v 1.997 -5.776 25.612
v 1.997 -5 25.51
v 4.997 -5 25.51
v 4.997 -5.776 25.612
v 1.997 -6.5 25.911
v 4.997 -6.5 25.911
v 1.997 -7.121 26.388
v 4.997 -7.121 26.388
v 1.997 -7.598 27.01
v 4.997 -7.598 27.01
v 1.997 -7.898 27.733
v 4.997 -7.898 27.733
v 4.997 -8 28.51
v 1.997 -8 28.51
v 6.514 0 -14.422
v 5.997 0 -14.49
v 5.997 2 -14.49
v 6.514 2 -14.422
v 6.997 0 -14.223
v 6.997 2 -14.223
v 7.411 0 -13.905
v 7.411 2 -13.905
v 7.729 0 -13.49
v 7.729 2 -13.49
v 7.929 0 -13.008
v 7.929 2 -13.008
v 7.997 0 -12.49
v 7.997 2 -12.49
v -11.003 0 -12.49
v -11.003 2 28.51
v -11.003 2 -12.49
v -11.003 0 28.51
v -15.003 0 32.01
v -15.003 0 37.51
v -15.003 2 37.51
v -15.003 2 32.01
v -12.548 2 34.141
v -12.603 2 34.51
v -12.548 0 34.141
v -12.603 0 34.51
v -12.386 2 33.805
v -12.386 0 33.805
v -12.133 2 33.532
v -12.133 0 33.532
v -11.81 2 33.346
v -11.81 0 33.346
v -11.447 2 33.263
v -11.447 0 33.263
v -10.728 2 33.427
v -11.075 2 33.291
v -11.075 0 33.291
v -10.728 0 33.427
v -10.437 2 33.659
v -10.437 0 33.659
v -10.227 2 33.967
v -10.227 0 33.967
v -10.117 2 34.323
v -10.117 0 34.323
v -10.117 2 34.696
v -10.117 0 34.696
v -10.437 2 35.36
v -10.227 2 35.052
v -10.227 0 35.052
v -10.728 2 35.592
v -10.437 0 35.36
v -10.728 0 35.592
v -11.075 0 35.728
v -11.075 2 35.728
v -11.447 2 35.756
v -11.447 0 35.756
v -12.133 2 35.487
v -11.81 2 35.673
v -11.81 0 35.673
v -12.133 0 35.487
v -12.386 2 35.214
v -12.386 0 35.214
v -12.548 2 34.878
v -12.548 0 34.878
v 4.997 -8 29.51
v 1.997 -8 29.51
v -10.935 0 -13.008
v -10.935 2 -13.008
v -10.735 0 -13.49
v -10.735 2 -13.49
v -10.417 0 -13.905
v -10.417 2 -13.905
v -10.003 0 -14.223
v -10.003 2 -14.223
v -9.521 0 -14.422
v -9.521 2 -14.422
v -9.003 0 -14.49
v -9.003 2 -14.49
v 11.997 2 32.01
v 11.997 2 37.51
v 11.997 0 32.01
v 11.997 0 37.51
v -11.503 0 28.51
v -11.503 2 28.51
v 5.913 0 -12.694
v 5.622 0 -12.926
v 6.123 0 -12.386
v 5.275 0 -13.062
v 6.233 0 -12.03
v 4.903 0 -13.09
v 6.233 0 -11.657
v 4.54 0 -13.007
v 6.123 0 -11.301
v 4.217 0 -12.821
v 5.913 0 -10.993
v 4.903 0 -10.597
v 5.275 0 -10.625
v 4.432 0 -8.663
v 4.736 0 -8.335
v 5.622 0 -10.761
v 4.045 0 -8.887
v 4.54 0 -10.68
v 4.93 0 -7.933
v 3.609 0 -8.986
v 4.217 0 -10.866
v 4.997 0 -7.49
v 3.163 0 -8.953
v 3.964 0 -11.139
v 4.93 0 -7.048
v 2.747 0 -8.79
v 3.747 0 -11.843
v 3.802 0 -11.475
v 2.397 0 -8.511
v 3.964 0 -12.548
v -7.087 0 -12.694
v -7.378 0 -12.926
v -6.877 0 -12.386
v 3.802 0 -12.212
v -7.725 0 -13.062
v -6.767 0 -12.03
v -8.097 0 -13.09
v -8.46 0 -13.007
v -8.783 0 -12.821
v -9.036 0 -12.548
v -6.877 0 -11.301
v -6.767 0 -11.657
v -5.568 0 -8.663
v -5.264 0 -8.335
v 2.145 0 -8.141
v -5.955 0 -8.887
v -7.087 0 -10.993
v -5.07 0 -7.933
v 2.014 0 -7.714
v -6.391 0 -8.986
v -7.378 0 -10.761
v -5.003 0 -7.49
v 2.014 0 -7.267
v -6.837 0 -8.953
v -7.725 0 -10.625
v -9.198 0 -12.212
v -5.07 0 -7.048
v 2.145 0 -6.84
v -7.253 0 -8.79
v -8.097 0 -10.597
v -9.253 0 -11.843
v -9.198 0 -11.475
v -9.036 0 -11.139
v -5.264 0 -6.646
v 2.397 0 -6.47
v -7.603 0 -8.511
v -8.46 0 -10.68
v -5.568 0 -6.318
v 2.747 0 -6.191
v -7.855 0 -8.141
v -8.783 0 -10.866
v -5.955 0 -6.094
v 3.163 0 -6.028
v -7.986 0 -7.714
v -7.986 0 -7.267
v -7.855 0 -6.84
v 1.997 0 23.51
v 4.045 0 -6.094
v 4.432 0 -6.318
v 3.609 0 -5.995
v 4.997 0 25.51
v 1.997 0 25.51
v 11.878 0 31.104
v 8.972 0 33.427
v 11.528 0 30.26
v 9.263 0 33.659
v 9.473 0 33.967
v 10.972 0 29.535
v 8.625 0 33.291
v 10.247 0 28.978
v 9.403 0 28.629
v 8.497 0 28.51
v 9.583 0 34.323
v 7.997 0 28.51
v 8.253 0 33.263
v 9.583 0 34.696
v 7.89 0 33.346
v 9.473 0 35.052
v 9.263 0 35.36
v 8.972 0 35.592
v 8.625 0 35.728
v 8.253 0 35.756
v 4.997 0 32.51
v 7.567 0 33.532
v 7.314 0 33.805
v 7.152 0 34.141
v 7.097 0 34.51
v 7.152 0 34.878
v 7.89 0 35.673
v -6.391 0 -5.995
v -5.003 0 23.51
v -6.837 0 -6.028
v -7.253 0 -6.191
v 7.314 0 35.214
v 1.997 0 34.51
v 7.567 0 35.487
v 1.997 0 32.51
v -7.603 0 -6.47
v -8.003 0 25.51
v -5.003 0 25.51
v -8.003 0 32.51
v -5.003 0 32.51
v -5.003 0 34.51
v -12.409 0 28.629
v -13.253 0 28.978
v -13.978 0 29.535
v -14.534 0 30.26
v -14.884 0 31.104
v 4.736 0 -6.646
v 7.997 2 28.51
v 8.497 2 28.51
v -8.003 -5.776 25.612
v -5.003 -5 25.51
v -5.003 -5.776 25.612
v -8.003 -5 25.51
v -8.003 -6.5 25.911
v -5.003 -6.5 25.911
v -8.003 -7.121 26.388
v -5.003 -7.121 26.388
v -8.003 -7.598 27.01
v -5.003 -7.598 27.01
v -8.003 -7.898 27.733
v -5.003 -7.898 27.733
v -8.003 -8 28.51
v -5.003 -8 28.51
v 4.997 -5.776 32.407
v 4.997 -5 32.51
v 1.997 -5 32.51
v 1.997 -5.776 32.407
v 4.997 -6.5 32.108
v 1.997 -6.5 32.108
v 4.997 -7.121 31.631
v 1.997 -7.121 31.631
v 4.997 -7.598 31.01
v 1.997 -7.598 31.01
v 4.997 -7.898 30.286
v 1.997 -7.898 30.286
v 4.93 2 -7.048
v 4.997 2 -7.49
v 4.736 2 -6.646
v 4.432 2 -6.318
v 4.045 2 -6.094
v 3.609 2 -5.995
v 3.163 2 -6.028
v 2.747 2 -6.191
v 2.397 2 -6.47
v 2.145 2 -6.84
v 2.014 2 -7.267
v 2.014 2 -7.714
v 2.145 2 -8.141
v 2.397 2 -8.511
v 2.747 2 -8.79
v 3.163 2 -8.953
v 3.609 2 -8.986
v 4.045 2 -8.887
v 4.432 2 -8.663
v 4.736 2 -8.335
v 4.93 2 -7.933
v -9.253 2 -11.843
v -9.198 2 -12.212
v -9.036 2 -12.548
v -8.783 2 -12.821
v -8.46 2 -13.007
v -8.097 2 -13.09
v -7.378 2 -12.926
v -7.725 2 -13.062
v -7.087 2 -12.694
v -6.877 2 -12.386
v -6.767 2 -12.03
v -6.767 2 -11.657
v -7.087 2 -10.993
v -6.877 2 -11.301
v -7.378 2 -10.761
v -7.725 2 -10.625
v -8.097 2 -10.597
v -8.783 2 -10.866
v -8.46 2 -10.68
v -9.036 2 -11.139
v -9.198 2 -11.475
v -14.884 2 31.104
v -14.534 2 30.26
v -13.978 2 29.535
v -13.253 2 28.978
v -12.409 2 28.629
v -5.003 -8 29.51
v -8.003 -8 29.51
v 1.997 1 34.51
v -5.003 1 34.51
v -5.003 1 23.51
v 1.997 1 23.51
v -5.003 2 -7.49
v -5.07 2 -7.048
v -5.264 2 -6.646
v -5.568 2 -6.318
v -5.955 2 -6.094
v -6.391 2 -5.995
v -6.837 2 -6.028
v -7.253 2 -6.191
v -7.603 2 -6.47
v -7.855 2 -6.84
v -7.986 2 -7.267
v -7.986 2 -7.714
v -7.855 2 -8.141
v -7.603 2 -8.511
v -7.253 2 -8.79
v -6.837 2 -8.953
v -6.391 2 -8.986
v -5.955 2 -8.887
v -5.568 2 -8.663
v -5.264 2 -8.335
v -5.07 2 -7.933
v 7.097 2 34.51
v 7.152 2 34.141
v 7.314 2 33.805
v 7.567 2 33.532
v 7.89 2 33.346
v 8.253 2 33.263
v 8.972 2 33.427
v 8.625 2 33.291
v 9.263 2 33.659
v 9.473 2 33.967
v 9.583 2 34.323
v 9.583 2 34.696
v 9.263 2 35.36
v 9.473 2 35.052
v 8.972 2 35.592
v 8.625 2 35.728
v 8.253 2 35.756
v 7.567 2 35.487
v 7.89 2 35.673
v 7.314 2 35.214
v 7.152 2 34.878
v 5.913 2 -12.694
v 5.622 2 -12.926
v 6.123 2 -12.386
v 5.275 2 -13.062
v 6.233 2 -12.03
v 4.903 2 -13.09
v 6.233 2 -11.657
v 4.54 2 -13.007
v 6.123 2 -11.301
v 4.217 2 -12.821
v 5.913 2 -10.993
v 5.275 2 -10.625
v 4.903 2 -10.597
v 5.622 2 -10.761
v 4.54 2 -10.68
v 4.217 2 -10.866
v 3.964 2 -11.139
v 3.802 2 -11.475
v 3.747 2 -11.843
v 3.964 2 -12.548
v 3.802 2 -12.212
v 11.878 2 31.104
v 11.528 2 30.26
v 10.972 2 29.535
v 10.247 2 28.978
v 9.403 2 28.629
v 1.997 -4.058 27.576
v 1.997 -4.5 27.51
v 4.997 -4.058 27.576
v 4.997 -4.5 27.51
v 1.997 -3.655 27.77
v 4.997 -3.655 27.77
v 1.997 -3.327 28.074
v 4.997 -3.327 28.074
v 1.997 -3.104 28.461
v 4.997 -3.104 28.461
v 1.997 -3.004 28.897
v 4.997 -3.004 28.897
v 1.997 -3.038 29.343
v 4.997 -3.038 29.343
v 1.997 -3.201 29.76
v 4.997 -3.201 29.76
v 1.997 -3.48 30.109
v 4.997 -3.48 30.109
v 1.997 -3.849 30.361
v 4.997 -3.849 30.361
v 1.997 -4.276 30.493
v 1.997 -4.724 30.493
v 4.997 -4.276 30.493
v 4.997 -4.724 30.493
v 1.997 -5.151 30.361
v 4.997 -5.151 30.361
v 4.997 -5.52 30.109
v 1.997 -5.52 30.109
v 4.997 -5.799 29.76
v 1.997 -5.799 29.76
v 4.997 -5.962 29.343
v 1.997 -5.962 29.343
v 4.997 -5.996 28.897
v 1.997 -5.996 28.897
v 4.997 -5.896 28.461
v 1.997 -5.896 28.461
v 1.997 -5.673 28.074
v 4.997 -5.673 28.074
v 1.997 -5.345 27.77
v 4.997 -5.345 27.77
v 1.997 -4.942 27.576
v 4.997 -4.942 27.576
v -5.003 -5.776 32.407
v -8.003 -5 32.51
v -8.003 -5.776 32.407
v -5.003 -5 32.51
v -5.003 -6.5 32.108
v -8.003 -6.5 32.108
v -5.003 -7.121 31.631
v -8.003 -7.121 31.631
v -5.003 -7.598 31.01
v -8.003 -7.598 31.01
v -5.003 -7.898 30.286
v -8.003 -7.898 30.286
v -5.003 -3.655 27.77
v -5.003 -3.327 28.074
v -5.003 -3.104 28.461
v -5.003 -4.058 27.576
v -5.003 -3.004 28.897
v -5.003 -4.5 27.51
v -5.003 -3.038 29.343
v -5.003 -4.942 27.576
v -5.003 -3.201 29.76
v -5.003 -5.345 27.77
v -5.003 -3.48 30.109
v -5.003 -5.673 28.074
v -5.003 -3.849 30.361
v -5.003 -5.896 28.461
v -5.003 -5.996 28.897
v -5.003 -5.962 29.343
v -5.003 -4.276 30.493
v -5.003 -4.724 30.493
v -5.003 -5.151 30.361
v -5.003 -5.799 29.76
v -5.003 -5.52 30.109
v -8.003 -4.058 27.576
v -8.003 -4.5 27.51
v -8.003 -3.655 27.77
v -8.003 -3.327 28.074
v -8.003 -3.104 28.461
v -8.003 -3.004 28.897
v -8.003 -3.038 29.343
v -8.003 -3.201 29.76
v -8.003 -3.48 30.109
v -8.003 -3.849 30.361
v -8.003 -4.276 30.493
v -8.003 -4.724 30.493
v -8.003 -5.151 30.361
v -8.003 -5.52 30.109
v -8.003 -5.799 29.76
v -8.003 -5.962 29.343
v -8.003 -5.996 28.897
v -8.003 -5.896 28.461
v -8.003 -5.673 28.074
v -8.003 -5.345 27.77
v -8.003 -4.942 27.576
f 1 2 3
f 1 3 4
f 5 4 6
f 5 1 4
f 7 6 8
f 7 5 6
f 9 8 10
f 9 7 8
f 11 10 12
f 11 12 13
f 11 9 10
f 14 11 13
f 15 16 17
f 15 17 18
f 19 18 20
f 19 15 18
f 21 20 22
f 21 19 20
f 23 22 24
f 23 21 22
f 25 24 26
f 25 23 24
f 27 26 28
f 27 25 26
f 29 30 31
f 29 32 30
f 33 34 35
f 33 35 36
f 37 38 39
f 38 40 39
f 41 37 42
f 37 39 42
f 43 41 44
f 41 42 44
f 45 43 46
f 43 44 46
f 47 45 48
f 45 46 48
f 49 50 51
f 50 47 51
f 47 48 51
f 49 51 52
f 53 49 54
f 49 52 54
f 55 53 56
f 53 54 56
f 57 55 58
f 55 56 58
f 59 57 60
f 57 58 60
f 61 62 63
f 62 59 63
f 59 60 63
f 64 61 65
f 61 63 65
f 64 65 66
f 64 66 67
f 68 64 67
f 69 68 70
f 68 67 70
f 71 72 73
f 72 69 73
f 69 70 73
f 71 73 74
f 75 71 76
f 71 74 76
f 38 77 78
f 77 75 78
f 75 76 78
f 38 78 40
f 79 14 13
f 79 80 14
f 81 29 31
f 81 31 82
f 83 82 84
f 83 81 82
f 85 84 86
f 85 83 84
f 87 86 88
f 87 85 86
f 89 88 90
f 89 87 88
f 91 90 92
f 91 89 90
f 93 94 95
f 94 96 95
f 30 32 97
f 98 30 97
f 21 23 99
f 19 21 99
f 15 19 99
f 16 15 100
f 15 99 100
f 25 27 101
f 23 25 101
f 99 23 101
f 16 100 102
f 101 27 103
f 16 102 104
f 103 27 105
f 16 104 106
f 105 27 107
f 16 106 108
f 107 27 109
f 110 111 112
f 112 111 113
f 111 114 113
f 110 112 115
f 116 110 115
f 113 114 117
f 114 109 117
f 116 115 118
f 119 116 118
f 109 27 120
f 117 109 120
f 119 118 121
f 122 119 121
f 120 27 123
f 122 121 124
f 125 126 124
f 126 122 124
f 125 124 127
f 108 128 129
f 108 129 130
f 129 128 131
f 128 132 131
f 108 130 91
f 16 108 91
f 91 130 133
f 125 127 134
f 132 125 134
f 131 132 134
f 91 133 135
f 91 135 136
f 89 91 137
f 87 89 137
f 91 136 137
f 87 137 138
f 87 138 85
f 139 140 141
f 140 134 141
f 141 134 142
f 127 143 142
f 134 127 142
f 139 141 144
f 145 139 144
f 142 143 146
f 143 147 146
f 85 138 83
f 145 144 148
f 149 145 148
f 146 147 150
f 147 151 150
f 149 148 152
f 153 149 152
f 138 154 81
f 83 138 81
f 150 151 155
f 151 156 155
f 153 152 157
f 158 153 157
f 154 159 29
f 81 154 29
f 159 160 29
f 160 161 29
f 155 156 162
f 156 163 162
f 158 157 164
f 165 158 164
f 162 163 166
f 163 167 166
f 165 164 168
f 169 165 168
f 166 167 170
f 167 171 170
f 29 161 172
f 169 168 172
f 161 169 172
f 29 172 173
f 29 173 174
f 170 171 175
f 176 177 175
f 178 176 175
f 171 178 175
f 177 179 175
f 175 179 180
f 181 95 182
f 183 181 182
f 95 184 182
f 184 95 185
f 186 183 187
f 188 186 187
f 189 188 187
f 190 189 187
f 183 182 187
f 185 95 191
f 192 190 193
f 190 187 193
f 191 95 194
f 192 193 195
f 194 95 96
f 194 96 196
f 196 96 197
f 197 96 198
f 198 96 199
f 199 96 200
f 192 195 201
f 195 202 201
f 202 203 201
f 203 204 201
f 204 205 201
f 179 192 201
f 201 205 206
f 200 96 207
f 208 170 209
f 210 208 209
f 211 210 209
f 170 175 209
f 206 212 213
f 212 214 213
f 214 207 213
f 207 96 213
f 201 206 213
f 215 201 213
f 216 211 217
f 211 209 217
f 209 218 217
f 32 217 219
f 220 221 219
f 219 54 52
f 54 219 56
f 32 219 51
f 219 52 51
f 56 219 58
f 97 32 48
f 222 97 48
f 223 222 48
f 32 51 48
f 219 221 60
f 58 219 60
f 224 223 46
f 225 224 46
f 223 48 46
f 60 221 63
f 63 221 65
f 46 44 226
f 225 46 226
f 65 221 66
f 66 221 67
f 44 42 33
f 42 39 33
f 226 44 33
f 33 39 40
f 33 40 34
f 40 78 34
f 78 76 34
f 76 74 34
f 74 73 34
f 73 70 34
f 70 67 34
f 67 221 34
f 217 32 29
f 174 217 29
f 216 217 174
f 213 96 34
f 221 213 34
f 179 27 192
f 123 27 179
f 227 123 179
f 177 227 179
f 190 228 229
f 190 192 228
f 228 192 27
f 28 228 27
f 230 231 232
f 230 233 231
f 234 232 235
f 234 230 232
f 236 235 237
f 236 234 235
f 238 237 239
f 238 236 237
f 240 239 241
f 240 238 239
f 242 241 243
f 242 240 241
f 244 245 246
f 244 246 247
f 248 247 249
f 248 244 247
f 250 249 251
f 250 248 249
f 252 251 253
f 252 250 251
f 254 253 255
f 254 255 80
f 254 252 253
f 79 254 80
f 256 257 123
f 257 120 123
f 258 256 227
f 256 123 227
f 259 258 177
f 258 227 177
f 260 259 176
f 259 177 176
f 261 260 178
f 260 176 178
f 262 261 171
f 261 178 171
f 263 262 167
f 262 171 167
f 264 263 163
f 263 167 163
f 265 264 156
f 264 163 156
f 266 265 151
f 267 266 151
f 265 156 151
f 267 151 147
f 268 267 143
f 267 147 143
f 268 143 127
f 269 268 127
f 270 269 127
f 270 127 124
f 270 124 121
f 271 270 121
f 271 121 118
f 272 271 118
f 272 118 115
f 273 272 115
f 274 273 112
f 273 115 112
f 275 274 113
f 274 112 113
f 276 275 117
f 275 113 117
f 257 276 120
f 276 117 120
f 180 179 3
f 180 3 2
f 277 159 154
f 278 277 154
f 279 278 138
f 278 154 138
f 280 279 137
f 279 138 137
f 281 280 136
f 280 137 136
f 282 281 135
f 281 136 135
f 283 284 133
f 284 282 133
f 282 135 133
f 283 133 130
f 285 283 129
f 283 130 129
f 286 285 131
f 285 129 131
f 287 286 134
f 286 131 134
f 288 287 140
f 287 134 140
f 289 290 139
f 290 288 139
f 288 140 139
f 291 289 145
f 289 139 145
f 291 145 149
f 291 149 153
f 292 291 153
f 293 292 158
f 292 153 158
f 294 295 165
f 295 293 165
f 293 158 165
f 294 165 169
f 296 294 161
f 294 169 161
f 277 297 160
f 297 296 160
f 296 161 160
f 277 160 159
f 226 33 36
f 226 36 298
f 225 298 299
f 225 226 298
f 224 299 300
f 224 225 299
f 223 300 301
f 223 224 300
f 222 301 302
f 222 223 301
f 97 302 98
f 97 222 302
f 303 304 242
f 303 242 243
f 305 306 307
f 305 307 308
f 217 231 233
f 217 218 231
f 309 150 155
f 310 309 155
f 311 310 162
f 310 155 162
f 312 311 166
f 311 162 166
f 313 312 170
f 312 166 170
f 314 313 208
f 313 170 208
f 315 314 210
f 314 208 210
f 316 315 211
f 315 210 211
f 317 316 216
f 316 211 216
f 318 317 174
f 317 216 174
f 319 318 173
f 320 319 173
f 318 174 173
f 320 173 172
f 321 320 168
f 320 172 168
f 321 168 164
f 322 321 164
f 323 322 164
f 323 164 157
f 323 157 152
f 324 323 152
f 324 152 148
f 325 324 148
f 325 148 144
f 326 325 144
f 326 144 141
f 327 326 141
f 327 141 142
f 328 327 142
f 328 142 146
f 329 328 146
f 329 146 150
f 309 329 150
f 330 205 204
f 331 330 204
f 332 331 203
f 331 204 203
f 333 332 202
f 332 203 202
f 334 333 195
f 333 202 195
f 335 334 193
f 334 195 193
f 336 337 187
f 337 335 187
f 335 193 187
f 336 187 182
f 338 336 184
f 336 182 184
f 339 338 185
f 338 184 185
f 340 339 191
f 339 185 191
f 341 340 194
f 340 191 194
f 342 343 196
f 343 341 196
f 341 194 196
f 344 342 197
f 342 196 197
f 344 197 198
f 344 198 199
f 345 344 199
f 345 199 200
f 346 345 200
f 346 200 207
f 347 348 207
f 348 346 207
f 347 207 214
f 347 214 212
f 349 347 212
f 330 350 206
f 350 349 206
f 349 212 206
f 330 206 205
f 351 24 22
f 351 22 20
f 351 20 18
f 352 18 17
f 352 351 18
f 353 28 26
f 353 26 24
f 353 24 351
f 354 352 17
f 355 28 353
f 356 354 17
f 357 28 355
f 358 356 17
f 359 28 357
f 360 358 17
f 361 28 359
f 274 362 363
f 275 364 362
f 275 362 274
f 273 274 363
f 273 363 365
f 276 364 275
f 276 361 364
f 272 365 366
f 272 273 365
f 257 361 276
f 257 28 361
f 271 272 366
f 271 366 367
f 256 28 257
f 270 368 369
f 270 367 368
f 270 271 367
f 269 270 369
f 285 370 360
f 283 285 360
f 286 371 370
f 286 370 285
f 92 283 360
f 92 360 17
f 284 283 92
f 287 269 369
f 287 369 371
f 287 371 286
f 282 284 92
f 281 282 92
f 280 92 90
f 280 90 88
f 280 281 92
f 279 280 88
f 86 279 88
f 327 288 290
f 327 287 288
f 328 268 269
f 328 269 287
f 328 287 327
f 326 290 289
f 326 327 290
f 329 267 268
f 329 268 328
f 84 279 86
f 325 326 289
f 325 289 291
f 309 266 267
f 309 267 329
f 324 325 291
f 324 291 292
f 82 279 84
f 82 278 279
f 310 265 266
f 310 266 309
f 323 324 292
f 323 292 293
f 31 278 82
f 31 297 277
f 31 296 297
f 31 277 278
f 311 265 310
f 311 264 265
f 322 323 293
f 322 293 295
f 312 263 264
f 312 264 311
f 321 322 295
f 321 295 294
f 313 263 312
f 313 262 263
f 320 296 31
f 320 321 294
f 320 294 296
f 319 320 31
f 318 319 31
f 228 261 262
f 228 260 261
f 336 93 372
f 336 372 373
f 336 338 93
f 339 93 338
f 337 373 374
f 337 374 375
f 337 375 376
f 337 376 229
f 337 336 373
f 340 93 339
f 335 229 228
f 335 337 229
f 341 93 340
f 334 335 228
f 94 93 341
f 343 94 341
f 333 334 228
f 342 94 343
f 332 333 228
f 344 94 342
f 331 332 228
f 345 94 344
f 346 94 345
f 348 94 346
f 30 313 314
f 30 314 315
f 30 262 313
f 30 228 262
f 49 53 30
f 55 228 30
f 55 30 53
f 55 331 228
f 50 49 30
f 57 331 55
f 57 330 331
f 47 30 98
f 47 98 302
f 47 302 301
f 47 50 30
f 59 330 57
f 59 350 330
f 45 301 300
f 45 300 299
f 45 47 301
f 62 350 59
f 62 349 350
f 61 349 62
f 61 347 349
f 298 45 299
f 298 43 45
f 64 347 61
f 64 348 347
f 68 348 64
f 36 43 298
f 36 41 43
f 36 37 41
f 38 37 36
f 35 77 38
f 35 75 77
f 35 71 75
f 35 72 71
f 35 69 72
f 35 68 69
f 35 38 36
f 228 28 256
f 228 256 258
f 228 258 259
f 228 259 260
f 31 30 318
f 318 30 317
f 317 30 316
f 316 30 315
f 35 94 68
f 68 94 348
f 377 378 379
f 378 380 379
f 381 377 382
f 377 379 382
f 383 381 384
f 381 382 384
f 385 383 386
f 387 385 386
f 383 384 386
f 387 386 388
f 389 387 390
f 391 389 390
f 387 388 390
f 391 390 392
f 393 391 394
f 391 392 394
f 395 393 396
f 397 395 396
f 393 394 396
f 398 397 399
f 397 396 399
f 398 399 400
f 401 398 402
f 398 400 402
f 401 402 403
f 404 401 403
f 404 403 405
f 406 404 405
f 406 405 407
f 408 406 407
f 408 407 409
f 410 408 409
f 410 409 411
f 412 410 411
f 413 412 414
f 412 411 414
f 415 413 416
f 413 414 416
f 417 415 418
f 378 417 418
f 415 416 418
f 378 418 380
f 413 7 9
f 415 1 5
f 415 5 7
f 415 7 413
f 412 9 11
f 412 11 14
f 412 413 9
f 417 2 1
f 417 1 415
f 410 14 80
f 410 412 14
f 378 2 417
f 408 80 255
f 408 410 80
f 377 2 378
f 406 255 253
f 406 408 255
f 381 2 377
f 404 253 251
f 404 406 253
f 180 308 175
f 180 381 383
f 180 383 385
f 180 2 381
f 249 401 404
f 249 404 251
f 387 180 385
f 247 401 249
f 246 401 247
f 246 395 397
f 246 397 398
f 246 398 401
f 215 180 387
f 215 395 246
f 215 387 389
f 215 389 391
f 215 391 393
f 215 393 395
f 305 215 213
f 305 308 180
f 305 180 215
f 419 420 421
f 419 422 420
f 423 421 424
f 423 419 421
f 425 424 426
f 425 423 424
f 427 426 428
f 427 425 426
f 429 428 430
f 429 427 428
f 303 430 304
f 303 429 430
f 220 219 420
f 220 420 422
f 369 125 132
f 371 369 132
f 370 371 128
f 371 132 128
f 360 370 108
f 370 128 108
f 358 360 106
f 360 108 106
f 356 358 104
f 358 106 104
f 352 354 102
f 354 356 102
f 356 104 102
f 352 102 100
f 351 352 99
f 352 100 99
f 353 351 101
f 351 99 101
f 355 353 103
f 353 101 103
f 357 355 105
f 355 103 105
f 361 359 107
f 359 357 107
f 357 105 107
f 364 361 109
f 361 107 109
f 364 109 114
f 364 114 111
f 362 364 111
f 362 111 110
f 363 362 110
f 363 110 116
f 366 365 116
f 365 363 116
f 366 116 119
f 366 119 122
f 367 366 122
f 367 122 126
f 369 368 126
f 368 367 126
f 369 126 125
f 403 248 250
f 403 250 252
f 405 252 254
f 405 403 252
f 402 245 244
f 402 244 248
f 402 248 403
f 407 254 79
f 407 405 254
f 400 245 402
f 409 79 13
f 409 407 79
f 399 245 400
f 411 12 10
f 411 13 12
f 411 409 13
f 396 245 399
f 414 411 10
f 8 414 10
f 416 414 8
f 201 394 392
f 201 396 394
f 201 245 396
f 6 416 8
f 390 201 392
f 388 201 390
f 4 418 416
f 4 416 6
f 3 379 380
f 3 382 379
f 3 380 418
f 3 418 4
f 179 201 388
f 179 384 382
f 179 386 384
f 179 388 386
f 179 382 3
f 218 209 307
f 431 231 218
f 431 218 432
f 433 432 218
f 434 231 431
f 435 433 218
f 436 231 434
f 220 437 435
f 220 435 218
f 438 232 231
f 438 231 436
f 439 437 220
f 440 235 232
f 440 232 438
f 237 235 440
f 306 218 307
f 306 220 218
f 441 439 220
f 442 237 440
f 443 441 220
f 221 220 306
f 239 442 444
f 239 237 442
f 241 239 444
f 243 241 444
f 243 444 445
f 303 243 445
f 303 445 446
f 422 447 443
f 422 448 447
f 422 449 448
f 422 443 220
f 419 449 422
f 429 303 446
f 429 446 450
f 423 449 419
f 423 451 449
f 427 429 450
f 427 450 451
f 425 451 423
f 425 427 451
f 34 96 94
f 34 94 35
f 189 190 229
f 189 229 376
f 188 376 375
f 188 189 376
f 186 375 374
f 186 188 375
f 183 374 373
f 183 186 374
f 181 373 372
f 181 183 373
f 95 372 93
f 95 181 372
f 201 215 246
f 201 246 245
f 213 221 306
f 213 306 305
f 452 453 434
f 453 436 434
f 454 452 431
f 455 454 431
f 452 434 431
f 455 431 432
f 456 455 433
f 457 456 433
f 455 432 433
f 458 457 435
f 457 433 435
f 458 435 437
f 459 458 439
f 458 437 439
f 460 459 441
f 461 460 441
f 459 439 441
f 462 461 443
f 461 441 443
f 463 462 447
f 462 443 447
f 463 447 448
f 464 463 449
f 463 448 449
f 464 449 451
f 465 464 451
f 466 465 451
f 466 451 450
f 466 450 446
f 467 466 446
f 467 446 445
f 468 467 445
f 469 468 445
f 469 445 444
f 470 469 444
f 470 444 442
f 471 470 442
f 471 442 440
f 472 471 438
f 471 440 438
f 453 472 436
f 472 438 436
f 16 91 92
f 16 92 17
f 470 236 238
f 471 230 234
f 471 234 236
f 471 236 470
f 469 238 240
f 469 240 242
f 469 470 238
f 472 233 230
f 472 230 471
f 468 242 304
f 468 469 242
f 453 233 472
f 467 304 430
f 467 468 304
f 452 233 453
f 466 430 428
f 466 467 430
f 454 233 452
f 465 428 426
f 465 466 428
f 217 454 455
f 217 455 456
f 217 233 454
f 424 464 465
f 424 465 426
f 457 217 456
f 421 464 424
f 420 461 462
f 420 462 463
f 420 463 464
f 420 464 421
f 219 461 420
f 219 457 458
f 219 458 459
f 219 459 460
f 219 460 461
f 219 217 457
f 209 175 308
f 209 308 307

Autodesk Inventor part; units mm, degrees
ref_plane "YZ Plane" through (0, 0, 0) normal (1, 0, 0) x (0, 1, 0)
ref_plane "XZ Plane" through (0, 0, 0) normal (0, 1, 0) x (-1, 0, 0)
ref_plane "XY Plane" through (0, 0, 0) normal (0, 0, 1) x (1, 0, 0)
sketch "Sketch1" plane through (0, 0, 0) normal (0, 1, 0) x (-1, 0, 0)
  line L0 (-6.9968, -12.4905) -> (-6.9968, 29.5095)
  line L1 (-6.9968, 29.5095) -> (-8.4968, 29.5095)
  line L2 (-7.9968, 46.0095) -> (-7.9968, 38.5095)
  line L3 (-7.9968, 38.5095) -> (-7.9968, 46.0095)
  arc A0 (-7.9968, 46.0095) -> (-9.4968, 47.5095) centre (-9.4968, 46.0095) ccw
  arc A1 (-7.9968, 46.0095) -> (-9.4968, 47.5095) centre (-9.4968, 46.0095) ccw
  line L4 (-9.4968, 47.5095) -> (-10.4968, 47.5095)
  line L5 (-9.4968, 47.5095) -> (-10.4968, 47.5095)
  line L6 (-11.9968, 46.0095) -> (-11.9968, 32.0095)
  arc A2 (-10.4968, 47.5095) -> (-11.9968, 46.0095) centre (-10.4968, 46.0095) ccw
  arc A3 (-11.9968, 32.0095) -> (-8.4968, 28.5095) centre (-8.4968, 32.0095) ccw
  line L7 (-11.9968, 46.0095) -> (-11.9968, 32.0095)
  arc A4 (-10.9968, 32.0095) -> (-8.4968, 29.5095) centre (-7.6108, 32.8955) ccw
  line L8 (-7.9968, 28.5095) -> (-7.9968, -12.4905)
  line L9 (-7.9968, 28.5095) -> (-8.4968, 28.5095)
  line L10 (-7.9968, 28.5095) -> (-8.4968, 28.5095)
  arc A5 (-11.9968, 32.0095) -> (-8.4968, 28.5095) centre (-8.4968, 32.0095) ccw
  line L11 (-8.4968, 28.5095) -> (-7.9968, 28.5095)
  line L12 (-7.9968, 28.5095) -> (-7.9968, -12.4905)
  arc A6 (-6.9968, -12.4905) -> (-5.8853, -13.4905) centre (-5.7634, -12.2372) ccw
  arc A7 (-7.9968, -12.4905) -> (-5.9968, -14.4905) centre (-5.9968, -12.4905) ccw
  arc A8 (-7.9968, -12.4905) -> (-5.9968, -14.4905) centre (-6.0394, -12.533) ccw
  line L13 (-5.9968, -14.4905) -> (1.5032, -14.4905)
  line L14 (1.5032, -14.4905) -> (1.5032, -16.2241)
  line L15 (-10.9968, 37.5095) -> (-10.9968, 32.0095)
  line L16 (-5.8853, -13.4905) -> (1.5032, -13.4905)
  line L17 (5.0532, -13.4905) -> (-2.0468, -13.4905)
  line L18 (-10.9968, 37.5095) -> (1.5032, 37.5095)
  line L19 (-7.9968, 38.5095) -> (1.5032, 38.5095)
  line L20 (10.0032, 29.5095) -> (11.5032, 29.5095)
  arc A9 (11.5032, 29.5095) -> (14.0032, 32.0095) centre (10.6172, 32.8955) ccw
  line L21 (14.0032, 37.5095) -> (14.0032, 32.0095)
  line L22 (14.0032, 37.5095) -> (1.5032, 37.5095)
  line L23 (11.0032, 38.5095) -> (1.5032, 38.5095)
  line L24 (11.0032, 38.5095) -> (11.0032, 46.0095)
  arc A10 (12.5032, 47.5095) -> (11.0032, 46.0095) centre (12.5032, 46.0095) ccw
  line L25 (12.5032, 47.5095) -> (13.5032, 47.5095)
  arc A11 (15.0032, 46.0095) -> (13.5032, 47.5095) centre (13.5032, 46.0095) ccw
  line L26 (15.0032, 46.0095) -> (15.0032, 32.0095)
  arc A12 (11.5032, 28.5095) -> (15.0032, 32.0095) centre (11.5032, 32.0095) ccw
  line L27 (11.0032, 28.5095) -> (11.5032, 28.5095)
  line L28 (11.0032, 28.5095) -> (11.0032, -12.4905)
  line L29 (10.0032, -12.4905) -> (10.0032, 29.5095)
  line L30 (8.8916, -13.4905) -> (1.5032, -13.4905)
  line L31 (9.0032, -14.4905) -> (1.5032, -14.4905)
  arc A13 (9.0032, -14.4905) -> (11.0032, -12.4905) centre (9.0032, -12.4905) ccw
  arc A14 (8.8916, -13.4905) -> (10.0032, -12.4905) centre (8.7697, -12.2372) ccw
  circle A15 centre (11.3532, 34.5095) radius 1.25
  circle A16 centre (11.3532, 34.5095) radius 1.25
  circle A17 centre (-8.3468, 34.5095) radius 1.25
  circle A18 centre (-8.3468, 34.5095) radius 1.25
  circle A19 centre (8.0032, -11.8434) radius 1.25
  circle A20 centre (8.0032, -11.8434) radius 1.25
  circle A21 centre (-4.9968, -11.8434) radius 1.25
  circle A22 centre (-4.9968, -11.8434) radius 1.25
  line L32 (-10.9968, 37.5095) -> (-11.9968, 37.5095)
  line L33 (14.0032, 37.5095) -> (15.0032, 37.5095)
  line L34 (15.0032, 37.5095) -> (15.0032, 46.0095)
  line L35 (-11.9968, 37.5095) -> (-11.9968, 46.0095)
  point P0 (0, 0)
  point P1 (5.0518, -13.4905)
  point P2 (-2.0454, -13.4905)
  point P3 (-2.0454, 37.5095)
  point P4 (5.0518, 37.5095)
  dimension "d11" = 2.5
  dimension "d6" = 3.5
  dimension "d7" = 1
  dimension "d8" = 1
  dimension "d9" = 3.5
  dimension "d10" = 0
extrude "Extrusion1" add sketch "Sketch1" along normal blind 2 contours A6 L16 L17 L30 A14 L29 L20 A9 L21 L33 L26 A12 L27 L28 A13 L31 L13 A7 L8 L9 A3 L6 L32 L15 A4 L1 L0 | L0 L1 A4 L15 L18 L22 L21 A9 L20 L29 A14 L30 L17 L16 A6
sketch "Sketch2" plane through (0, 0, 0) normal (0, -1, 0) x (1, 0, 0)
  line L0 (4.9968, 25.5095) -> (1.9968, 25.5095)
  line L1 (1.9968, 25.5095) -> (1.9968, 32.5095)
  line L2 (1.9968, 32.5095) -> (4.9968, 32.5095)
  line L3 (4.9968, 32.5095) -> (4.9968, 25.5095)
  line L4 (-5.0032, 25.5095) -> (-8.0032, 25.5095)
  line L5 (-8.0032, 25.5095) -> (-8.0032, 32.5095)
  line L6 (-8.0032, 32.5095) -> (-5.0032, 32.5095)
  line L7 (-5.0032, 32.5095) -> (-5.0032, 25.5095)
  line L8 (-8.8916, -13.4905) -> (5.8853, -13.4905) projected
  line L9 (-15.0032, 37.5095) -> (11.9968, 37.5095) projected
  line L10 (-11.0032, -12.4905) -> (-11.0032, 28.5095) projected
  point P0 (0, 0)
  point P1 (10.9968, 37.5095)
  point P2 (-14.0032, 37.5095)
  dimension "d15" = 7
  dimension "d18" = 3
  dimension "d21" = 7
  dimension "d32" = 3
  dimension "d36" = 5
  dimension "d41" = 3
extrude "Extrusion2" add sketch "Sketch2" along normal blind 8
fillet "Fillet1" radius 3 4 edges at (-6.5032, -8, 32.5095) (-6.5032, -8, 25.5095) (3.4968, -8, 32.5095) (3.4968, -8, 25.5095)
sketch "Sketch4" plane through (0, 0, 0) normal (0, -1, 0) x (1, 0, 0)
  line L0 (1.9968, 23.5095) -> (-5.0032, 23.5095)
  line L1 (-5.0032, 23.5095) -> (-5.0032, 34.5095)
  line L2 (-5.0032, 34.5095) -> (1.9968, 34.5095)
  line L3 (1.9968, 34.5095) -> (1.9968, 23.5095)
  line L4 (-5.0032, 32.5095) -> (-8.0032, 32.5095) projected
  line L5 (-5.0032, 25.5095) -> (-8.0032, 25.5095) projected
  point P0 (0, 0)
  dimension "d37" = 2
  dimension "d38" = 2
extrude "Extrusion4" cut sketch "Sketch4" against normal blind 1
sketch "Sketch5" plane through (4.9968, 0, 32.5095) normal (1, 0, 0) x (0, 0, -1)
  circle A0 centre (3.5, -4.5) radius 1.5
  line L0 (4, 0) -> (45, 0) projected
  line L1 (7, 0) -> (7, -5) projected
  line L2 (0, 0) -> (0, -5) projected
  point P0 (32.5095, 0)
  dimension "d42" = 3
  dimension "d43" = 4.5
  dimension "d44" = 3.5
  dimension "d45" = 3.5
extrude "Extrusion5" cut sketch "Sketch5" against normal blind 15
sketch "Sketch6" plane through (0, 0, 0) normal (0, -1, 0) x (1, 0, 0)
  line L0 (5.9968, -14.4905) -> (-9.0032, -14.4905) projected
  line L1 (-1.5032, -14.4905) -> (-1.5032, -0.2916)
  line L2 (-1.5032, -7.4905) -> (-6.5032, -7.4905)
  circle A0 centre (-6.5032, -7.4905) radius 1.5
  circle A1 centre (3.4968, -7.4905) radius 1.5
  point P0 (0, 0)
  dimension "d48" = 3
  dimension "d49" = 5
  dimension "d52" = 7
extrude "Extrusion6" cut sketch "Sketch6" against normal blind 3
equation "\"d6\" = d9"
equation "\"d7\" = d12"
equation "\"d8\" = d12"
equation "\"d32\" = d18"
equation "\"d12\" = 1"
